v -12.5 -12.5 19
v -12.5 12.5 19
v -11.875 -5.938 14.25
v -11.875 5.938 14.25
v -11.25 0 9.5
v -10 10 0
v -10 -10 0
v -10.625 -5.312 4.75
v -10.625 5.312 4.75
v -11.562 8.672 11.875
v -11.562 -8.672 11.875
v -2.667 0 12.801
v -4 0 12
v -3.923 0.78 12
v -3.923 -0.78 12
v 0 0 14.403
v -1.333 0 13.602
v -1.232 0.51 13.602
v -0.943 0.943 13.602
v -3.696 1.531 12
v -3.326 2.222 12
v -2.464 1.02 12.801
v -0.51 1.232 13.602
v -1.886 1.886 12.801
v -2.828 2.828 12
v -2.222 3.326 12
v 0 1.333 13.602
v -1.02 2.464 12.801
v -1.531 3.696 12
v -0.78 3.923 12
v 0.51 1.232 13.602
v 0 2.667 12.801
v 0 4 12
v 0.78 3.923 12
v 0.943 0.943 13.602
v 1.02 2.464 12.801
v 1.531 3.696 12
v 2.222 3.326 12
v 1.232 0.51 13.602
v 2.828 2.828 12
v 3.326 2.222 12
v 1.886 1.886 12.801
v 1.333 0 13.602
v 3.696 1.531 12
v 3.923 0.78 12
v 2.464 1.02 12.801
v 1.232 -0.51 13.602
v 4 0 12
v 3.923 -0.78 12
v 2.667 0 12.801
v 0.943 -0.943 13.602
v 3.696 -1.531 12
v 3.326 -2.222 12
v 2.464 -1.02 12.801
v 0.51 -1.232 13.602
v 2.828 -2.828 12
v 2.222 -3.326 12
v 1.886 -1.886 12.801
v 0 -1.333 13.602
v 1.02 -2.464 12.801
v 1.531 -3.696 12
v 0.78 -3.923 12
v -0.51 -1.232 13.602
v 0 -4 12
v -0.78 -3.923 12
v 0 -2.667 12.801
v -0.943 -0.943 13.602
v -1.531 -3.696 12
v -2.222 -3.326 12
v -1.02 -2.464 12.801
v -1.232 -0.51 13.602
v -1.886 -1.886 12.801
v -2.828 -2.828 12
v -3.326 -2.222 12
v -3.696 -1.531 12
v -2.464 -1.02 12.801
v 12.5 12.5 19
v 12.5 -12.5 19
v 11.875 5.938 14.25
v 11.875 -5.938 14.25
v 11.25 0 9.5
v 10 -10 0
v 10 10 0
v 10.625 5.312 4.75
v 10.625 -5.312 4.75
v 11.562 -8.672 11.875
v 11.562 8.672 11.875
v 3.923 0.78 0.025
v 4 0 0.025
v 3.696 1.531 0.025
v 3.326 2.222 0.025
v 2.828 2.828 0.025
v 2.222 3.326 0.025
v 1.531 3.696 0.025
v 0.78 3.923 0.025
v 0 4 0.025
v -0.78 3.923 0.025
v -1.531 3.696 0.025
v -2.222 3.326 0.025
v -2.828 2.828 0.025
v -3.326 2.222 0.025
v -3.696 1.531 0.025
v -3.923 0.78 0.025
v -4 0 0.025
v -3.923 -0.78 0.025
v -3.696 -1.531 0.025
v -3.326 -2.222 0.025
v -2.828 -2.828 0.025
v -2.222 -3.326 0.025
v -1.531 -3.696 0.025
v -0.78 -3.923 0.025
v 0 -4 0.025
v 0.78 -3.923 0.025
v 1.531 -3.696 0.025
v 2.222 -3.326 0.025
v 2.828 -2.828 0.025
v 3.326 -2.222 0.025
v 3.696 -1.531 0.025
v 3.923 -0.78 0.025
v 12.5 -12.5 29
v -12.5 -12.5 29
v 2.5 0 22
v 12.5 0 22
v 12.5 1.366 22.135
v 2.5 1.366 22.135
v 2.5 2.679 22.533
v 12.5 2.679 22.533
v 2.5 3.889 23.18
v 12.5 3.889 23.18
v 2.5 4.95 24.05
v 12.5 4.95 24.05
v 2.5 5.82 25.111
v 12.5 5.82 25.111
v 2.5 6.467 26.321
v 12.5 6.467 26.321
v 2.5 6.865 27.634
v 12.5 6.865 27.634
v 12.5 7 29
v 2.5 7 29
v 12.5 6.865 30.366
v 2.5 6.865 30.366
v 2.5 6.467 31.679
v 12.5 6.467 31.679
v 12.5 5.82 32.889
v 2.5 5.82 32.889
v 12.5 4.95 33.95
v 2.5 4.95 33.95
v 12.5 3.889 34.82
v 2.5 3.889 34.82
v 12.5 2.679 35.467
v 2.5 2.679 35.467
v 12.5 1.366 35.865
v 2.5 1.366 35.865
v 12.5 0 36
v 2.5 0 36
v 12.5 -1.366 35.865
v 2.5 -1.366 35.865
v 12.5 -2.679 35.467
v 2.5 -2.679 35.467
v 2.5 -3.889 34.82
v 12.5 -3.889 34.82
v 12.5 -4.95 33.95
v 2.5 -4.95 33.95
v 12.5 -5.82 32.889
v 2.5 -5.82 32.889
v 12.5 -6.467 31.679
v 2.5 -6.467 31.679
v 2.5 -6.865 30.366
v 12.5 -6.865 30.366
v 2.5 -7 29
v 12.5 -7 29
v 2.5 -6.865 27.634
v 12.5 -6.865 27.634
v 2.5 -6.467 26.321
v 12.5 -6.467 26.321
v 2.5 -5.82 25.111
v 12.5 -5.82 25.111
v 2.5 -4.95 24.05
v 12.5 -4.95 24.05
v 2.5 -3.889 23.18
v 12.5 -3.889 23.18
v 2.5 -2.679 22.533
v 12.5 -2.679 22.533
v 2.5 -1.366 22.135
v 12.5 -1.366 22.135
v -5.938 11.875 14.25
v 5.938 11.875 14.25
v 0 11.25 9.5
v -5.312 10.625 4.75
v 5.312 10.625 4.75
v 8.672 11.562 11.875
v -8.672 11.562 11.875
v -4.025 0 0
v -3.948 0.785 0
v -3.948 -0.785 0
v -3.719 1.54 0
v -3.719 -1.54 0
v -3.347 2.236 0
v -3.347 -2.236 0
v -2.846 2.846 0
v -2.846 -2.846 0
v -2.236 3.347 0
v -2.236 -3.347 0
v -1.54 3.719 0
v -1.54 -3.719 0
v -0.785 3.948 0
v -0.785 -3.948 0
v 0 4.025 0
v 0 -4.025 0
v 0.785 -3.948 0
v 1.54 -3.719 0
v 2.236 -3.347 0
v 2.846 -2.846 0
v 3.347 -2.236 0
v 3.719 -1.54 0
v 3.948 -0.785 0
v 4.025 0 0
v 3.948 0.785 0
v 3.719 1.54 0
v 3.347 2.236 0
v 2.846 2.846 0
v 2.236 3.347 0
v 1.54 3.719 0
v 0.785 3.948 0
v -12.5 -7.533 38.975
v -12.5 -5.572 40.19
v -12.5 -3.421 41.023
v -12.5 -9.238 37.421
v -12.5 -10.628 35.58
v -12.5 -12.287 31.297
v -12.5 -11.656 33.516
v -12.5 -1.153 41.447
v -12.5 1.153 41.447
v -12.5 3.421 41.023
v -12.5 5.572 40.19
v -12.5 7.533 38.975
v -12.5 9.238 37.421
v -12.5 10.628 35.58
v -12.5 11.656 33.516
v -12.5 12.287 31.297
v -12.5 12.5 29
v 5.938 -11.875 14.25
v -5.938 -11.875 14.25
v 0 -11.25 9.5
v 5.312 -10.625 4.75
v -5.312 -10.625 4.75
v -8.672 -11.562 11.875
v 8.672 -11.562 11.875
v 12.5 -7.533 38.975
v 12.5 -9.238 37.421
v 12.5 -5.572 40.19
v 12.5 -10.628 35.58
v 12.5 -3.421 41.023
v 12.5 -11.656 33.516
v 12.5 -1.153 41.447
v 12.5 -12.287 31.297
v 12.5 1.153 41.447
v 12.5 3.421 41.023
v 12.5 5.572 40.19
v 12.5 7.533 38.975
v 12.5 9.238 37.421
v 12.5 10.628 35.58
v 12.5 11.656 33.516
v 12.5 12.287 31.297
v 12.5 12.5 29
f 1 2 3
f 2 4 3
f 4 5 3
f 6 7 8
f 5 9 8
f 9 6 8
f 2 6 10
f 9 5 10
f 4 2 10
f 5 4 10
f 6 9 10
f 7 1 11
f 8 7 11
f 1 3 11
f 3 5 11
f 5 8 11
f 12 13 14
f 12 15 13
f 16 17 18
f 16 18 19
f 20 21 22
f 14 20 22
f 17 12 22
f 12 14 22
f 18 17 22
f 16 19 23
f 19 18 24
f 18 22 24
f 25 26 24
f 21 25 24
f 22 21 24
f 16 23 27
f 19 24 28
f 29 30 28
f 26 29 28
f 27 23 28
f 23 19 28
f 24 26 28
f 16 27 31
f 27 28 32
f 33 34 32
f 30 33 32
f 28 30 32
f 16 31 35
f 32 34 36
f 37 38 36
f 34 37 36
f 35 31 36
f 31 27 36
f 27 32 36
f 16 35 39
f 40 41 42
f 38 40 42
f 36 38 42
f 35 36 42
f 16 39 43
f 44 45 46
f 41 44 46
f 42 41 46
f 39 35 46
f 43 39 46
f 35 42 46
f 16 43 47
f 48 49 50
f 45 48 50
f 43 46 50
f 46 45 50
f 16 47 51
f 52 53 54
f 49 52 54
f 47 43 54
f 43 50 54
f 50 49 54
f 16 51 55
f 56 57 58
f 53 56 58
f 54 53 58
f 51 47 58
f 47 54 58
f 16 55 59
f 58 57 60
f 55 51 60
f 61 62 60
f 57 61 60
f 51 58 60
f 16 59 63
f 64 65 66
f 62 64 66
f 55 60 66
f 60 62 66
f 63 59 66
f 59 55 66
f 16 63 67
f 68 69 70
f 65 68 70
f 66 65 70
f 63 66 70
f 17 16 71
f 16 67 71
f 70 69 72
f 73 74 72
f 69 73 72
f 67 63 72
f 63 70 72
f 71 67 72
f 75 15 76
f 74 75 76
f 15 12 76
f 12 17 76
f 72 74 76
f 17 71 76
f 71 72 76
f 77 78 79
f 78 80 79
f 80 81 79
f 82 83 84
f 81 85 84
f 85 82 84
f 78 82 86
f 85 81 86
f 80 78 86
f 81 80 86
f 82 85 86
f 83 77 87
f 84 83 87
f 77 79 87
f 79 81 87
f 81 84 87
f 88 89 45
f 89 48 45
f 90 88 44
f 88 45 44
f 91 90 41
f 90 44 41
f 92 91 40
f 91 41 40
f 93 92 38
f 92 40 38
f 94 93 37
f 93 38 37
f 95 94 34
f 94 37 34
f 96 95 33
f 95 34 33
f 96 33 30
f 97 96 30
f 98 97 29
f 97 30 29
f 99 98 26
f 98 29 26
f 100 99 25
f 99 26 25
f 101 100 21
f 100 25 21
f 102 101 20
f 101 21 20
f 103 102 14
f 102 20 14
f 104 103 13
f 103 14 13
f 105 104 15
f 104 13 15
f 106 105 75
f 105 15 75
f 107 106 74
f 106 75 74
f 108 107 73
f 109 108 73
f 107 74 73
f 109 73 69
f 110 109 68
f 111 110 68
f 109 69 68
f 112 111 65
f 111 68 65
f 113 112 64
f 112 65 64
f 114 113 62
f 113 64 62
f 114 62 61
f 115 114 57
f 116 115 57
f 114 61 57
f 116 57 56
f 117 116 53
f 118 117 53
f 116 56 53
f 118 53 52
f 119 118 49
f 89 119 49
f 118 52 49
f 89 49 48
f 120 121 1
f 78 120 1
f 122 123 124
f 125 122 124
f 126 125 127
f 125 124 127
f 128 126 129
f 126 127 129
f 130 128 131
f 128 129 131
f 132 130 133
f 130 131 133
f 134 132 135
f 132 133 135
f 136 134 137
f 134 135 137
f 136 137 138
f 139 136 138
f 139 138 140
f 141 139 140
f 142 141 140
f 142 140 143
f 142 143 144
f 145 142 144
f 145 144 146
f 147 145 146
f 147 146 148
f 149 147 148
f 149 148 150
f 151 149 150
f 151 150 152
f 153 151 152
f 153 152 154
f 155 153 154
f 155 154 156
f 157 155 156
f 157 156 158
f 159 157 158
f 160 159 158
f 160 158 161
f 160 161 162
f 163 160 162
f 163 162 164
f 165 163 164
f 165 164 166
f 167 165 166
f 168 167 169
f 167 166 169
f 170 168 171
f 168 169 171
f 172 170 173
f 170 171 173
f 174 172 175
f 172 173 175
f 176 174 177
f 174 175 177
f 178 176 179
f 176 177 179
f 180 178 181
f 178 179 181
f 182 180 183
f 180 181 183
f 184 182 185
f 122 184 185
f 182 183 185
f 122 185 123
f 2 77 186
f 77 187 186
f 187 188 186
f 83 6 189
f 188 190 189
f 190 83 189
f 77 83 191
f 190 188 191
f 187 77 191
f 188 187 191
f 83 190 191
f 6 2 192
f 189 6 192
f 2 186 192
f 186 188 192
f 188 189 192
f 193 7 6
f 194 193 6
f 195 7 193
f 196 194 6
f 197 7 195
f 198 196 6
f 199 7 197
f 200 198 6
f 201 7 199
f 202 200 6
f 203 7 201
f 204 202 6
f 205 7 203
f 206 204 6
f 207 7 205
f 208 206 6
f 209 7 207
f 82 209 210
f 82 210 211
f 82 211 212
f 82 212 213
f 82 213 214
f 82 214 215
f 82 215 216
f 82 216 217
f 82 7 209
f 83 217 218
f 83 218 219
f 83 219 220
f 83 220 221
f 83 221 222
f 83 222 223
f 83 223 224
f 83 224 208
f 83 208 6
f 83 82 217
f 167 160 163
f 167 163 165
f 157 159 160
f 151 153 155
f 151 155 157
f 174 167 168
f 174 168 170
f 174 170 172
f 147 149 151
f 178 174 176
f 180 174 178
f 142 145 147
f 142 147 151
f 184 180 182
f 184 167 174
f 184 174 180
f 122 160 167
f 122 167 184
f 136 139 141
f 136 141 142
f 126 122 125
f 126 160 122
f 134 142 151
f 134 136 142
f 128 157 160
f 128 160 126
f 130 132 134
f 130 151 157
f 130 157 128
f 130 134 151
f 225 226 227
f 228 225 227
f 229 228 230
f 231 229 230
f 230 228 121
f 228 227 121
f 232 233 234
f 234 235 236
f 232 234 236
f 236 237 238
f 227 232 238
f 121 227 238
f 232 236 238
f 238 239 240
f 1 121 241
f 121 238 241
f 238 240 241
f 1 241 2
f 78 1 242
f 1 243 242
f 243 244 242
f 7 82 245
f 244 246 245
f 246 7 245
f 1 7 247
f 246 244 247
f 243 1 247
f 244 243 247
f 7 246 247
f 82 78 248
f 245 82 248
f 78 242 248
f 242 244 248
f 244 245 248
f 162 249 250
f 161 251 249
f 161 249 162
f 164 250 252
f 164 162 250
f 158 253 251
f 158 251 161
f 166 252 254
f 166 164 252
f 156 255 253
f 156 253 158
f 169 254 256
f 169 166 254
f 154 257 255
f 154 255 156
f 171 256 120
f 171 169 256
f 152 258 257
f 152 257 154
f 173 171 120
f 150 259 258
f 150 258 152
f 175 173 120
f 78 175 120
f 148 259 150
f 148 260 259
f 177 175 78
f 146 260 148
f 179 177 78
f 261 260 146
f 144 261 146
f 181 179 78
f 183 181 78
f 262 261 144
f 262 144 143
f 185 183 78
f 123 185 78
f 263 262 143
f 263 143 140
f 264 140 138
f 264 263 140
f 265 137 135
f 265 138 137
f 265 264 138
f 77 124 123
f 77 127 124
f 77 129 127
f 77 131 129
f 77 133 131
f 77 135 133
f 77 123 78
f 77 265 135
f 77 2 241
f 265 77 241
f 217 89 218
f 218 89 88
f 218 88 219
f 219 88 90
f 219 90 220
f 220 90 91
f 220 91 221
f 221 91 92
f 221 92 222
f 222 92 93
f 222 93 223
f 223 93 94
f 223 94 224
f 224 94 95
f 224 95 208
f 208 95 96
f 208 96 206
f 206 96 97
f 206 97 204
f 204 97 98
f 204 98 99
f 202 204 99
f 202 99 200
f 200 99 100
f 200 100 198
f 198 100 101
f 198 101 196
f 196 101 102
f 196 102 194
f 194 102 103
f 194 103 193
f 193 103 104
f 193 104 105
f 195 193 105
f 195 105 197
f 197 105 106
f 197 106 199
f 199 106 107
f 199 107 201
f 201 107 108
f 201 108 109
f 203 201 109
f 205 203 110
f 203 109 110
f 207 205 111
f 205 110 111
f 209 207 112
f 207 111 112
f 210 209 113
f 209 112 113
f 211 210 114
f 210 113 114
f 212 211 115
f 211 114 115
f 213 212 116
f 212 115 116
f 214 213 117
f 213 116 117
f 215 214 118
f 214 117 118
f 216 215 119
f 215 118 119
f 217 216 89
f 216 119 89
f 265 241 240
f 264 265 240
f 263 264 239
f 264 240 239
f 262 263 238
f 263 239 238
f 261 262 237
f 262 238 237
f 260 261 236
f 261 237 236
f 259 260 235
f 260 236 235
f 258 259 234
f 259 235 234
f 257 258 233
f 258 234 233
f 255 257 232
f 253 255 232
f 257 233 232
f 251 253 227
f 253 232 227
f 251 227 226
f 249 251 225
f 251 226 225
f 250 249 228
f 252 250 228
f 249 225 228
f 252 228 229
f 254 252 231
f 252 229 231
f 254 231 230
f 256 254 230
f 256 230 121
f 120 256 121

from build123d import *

# Parameters (mm, degrees)
BOSS_EXTRUDE1_DEPTH             = 12.5
BOSS_EXTRUDE1_DEPTH_BACK        = 12.5
SKETCH4_R                       = 7
CUT_EXTRUDE1_DEPTH              = 10
F_8_0MM_DOWEL_HOLE1_D           = 8
F_8_0MM_DOWEL_HOLE1_DEPTH       = 12
F_8_0MM_DOWEL_HOLE1_CSINK_D     = 8.05
F_8_0MM_DOWEL_HOLE1_CSINK_ANGLE = 90
F_8_0MM_DOWEL_HOLE1_TIP         = 2.403442476


with BuildPart() as part:
    # Sketch2 → Loft1 section 0
    with BuildSketch(Plane.XY.offset(19)):
        with BuildLine():
            Line((-12.5, -12.5), (12.5, -12.5))
            Line((12.5, -12.5), (12.5, 12.5))
            Line((12.5, 12.5), (-12.5, 12.5))
            Line((-12.5, 12.5), (-12.5, -12.5))
        make_face()
    # Sketch1 → Loft1 section 1
    with BuildSketch(Plane.XY):
        with BuildLine():
            Line((-10, -10), (10, -10))
            Line((10, -10), (10, 10))
            Line((10, 10), (-10, 10))
            Line((-10, 10), (-10, -10))
        make_face()
    loft()

    # Sketch3 → Boss-Extrude1 (add, two sides: drawn at the far end of the back side and taken through both)
    with BuildSketch(Plane(origin=(0, 0, 0), x_dir=(0, 0, -1), z_dir=(1, 0, 0)).offset(-BOSS_EXTRUDE1_DEPTH_BACK)):
        with BuildLine():
            Line((-19, 12.5), (-29, 12.5))
            ThreePointArc((-29, 12.5), (-41.5, 0), (-29, -12.5))
            Line((-29, -12.5), (-19, -12.5))
            Line((-19, -12.5), (-19, 12.5))
        make_face()
    extrude(amount=BOSS_EXTRUDE1_DEPTH + BOSS_EXTRUDE1_DEPTH_BACK)

    # Sketch4 → Cut-Extrude1 (cut)
    with BuildSketch(Plane(origin=(12.5001, 0, 0), x_dir=(0, 0, -1), z_dir=(1, 0, 0))):
        with Locations((-29, 0)):
            Circle(SKETCH4_R)
    extrude(amount=-CUT_EXTRUDE1_DEPTH, mode=Mode.SUBTRACT)

    # Ø8.0mm Dowel Hole1
    with Locations(Plane(origin=(0, 0, 0), x_dir=(-1, 0, 0), z_dir=(0, 0, -1))):
        with Locations((0, 0)):
            CounterSinkHole(F_8_0MM_DOWEL_HOLE1_D / 2, F_8_0MM_DOWEL_HOLE1_CSINK_D / 2, depth=F_8_0MM_DOWEL_HOLE1_DEPTH, counter_sink_angle=F_8_0MM_DOWEL_HOLE1_CSINK_ANGLE)
            with Locations((0, 0, -(F_8_0MM_DOWEL_HOLE1_DEPTH + F_8_0MM_DOWEL_HOLE1_TIP / 2))):  # 118° drill point
                Cone(0, F_8_0MM_DOWEL_HOLE1_D / 2, F_8_0MM_DOWEL_HOLE1_TIP, mode=Mode.SUBTRACT)


solid = part.part
